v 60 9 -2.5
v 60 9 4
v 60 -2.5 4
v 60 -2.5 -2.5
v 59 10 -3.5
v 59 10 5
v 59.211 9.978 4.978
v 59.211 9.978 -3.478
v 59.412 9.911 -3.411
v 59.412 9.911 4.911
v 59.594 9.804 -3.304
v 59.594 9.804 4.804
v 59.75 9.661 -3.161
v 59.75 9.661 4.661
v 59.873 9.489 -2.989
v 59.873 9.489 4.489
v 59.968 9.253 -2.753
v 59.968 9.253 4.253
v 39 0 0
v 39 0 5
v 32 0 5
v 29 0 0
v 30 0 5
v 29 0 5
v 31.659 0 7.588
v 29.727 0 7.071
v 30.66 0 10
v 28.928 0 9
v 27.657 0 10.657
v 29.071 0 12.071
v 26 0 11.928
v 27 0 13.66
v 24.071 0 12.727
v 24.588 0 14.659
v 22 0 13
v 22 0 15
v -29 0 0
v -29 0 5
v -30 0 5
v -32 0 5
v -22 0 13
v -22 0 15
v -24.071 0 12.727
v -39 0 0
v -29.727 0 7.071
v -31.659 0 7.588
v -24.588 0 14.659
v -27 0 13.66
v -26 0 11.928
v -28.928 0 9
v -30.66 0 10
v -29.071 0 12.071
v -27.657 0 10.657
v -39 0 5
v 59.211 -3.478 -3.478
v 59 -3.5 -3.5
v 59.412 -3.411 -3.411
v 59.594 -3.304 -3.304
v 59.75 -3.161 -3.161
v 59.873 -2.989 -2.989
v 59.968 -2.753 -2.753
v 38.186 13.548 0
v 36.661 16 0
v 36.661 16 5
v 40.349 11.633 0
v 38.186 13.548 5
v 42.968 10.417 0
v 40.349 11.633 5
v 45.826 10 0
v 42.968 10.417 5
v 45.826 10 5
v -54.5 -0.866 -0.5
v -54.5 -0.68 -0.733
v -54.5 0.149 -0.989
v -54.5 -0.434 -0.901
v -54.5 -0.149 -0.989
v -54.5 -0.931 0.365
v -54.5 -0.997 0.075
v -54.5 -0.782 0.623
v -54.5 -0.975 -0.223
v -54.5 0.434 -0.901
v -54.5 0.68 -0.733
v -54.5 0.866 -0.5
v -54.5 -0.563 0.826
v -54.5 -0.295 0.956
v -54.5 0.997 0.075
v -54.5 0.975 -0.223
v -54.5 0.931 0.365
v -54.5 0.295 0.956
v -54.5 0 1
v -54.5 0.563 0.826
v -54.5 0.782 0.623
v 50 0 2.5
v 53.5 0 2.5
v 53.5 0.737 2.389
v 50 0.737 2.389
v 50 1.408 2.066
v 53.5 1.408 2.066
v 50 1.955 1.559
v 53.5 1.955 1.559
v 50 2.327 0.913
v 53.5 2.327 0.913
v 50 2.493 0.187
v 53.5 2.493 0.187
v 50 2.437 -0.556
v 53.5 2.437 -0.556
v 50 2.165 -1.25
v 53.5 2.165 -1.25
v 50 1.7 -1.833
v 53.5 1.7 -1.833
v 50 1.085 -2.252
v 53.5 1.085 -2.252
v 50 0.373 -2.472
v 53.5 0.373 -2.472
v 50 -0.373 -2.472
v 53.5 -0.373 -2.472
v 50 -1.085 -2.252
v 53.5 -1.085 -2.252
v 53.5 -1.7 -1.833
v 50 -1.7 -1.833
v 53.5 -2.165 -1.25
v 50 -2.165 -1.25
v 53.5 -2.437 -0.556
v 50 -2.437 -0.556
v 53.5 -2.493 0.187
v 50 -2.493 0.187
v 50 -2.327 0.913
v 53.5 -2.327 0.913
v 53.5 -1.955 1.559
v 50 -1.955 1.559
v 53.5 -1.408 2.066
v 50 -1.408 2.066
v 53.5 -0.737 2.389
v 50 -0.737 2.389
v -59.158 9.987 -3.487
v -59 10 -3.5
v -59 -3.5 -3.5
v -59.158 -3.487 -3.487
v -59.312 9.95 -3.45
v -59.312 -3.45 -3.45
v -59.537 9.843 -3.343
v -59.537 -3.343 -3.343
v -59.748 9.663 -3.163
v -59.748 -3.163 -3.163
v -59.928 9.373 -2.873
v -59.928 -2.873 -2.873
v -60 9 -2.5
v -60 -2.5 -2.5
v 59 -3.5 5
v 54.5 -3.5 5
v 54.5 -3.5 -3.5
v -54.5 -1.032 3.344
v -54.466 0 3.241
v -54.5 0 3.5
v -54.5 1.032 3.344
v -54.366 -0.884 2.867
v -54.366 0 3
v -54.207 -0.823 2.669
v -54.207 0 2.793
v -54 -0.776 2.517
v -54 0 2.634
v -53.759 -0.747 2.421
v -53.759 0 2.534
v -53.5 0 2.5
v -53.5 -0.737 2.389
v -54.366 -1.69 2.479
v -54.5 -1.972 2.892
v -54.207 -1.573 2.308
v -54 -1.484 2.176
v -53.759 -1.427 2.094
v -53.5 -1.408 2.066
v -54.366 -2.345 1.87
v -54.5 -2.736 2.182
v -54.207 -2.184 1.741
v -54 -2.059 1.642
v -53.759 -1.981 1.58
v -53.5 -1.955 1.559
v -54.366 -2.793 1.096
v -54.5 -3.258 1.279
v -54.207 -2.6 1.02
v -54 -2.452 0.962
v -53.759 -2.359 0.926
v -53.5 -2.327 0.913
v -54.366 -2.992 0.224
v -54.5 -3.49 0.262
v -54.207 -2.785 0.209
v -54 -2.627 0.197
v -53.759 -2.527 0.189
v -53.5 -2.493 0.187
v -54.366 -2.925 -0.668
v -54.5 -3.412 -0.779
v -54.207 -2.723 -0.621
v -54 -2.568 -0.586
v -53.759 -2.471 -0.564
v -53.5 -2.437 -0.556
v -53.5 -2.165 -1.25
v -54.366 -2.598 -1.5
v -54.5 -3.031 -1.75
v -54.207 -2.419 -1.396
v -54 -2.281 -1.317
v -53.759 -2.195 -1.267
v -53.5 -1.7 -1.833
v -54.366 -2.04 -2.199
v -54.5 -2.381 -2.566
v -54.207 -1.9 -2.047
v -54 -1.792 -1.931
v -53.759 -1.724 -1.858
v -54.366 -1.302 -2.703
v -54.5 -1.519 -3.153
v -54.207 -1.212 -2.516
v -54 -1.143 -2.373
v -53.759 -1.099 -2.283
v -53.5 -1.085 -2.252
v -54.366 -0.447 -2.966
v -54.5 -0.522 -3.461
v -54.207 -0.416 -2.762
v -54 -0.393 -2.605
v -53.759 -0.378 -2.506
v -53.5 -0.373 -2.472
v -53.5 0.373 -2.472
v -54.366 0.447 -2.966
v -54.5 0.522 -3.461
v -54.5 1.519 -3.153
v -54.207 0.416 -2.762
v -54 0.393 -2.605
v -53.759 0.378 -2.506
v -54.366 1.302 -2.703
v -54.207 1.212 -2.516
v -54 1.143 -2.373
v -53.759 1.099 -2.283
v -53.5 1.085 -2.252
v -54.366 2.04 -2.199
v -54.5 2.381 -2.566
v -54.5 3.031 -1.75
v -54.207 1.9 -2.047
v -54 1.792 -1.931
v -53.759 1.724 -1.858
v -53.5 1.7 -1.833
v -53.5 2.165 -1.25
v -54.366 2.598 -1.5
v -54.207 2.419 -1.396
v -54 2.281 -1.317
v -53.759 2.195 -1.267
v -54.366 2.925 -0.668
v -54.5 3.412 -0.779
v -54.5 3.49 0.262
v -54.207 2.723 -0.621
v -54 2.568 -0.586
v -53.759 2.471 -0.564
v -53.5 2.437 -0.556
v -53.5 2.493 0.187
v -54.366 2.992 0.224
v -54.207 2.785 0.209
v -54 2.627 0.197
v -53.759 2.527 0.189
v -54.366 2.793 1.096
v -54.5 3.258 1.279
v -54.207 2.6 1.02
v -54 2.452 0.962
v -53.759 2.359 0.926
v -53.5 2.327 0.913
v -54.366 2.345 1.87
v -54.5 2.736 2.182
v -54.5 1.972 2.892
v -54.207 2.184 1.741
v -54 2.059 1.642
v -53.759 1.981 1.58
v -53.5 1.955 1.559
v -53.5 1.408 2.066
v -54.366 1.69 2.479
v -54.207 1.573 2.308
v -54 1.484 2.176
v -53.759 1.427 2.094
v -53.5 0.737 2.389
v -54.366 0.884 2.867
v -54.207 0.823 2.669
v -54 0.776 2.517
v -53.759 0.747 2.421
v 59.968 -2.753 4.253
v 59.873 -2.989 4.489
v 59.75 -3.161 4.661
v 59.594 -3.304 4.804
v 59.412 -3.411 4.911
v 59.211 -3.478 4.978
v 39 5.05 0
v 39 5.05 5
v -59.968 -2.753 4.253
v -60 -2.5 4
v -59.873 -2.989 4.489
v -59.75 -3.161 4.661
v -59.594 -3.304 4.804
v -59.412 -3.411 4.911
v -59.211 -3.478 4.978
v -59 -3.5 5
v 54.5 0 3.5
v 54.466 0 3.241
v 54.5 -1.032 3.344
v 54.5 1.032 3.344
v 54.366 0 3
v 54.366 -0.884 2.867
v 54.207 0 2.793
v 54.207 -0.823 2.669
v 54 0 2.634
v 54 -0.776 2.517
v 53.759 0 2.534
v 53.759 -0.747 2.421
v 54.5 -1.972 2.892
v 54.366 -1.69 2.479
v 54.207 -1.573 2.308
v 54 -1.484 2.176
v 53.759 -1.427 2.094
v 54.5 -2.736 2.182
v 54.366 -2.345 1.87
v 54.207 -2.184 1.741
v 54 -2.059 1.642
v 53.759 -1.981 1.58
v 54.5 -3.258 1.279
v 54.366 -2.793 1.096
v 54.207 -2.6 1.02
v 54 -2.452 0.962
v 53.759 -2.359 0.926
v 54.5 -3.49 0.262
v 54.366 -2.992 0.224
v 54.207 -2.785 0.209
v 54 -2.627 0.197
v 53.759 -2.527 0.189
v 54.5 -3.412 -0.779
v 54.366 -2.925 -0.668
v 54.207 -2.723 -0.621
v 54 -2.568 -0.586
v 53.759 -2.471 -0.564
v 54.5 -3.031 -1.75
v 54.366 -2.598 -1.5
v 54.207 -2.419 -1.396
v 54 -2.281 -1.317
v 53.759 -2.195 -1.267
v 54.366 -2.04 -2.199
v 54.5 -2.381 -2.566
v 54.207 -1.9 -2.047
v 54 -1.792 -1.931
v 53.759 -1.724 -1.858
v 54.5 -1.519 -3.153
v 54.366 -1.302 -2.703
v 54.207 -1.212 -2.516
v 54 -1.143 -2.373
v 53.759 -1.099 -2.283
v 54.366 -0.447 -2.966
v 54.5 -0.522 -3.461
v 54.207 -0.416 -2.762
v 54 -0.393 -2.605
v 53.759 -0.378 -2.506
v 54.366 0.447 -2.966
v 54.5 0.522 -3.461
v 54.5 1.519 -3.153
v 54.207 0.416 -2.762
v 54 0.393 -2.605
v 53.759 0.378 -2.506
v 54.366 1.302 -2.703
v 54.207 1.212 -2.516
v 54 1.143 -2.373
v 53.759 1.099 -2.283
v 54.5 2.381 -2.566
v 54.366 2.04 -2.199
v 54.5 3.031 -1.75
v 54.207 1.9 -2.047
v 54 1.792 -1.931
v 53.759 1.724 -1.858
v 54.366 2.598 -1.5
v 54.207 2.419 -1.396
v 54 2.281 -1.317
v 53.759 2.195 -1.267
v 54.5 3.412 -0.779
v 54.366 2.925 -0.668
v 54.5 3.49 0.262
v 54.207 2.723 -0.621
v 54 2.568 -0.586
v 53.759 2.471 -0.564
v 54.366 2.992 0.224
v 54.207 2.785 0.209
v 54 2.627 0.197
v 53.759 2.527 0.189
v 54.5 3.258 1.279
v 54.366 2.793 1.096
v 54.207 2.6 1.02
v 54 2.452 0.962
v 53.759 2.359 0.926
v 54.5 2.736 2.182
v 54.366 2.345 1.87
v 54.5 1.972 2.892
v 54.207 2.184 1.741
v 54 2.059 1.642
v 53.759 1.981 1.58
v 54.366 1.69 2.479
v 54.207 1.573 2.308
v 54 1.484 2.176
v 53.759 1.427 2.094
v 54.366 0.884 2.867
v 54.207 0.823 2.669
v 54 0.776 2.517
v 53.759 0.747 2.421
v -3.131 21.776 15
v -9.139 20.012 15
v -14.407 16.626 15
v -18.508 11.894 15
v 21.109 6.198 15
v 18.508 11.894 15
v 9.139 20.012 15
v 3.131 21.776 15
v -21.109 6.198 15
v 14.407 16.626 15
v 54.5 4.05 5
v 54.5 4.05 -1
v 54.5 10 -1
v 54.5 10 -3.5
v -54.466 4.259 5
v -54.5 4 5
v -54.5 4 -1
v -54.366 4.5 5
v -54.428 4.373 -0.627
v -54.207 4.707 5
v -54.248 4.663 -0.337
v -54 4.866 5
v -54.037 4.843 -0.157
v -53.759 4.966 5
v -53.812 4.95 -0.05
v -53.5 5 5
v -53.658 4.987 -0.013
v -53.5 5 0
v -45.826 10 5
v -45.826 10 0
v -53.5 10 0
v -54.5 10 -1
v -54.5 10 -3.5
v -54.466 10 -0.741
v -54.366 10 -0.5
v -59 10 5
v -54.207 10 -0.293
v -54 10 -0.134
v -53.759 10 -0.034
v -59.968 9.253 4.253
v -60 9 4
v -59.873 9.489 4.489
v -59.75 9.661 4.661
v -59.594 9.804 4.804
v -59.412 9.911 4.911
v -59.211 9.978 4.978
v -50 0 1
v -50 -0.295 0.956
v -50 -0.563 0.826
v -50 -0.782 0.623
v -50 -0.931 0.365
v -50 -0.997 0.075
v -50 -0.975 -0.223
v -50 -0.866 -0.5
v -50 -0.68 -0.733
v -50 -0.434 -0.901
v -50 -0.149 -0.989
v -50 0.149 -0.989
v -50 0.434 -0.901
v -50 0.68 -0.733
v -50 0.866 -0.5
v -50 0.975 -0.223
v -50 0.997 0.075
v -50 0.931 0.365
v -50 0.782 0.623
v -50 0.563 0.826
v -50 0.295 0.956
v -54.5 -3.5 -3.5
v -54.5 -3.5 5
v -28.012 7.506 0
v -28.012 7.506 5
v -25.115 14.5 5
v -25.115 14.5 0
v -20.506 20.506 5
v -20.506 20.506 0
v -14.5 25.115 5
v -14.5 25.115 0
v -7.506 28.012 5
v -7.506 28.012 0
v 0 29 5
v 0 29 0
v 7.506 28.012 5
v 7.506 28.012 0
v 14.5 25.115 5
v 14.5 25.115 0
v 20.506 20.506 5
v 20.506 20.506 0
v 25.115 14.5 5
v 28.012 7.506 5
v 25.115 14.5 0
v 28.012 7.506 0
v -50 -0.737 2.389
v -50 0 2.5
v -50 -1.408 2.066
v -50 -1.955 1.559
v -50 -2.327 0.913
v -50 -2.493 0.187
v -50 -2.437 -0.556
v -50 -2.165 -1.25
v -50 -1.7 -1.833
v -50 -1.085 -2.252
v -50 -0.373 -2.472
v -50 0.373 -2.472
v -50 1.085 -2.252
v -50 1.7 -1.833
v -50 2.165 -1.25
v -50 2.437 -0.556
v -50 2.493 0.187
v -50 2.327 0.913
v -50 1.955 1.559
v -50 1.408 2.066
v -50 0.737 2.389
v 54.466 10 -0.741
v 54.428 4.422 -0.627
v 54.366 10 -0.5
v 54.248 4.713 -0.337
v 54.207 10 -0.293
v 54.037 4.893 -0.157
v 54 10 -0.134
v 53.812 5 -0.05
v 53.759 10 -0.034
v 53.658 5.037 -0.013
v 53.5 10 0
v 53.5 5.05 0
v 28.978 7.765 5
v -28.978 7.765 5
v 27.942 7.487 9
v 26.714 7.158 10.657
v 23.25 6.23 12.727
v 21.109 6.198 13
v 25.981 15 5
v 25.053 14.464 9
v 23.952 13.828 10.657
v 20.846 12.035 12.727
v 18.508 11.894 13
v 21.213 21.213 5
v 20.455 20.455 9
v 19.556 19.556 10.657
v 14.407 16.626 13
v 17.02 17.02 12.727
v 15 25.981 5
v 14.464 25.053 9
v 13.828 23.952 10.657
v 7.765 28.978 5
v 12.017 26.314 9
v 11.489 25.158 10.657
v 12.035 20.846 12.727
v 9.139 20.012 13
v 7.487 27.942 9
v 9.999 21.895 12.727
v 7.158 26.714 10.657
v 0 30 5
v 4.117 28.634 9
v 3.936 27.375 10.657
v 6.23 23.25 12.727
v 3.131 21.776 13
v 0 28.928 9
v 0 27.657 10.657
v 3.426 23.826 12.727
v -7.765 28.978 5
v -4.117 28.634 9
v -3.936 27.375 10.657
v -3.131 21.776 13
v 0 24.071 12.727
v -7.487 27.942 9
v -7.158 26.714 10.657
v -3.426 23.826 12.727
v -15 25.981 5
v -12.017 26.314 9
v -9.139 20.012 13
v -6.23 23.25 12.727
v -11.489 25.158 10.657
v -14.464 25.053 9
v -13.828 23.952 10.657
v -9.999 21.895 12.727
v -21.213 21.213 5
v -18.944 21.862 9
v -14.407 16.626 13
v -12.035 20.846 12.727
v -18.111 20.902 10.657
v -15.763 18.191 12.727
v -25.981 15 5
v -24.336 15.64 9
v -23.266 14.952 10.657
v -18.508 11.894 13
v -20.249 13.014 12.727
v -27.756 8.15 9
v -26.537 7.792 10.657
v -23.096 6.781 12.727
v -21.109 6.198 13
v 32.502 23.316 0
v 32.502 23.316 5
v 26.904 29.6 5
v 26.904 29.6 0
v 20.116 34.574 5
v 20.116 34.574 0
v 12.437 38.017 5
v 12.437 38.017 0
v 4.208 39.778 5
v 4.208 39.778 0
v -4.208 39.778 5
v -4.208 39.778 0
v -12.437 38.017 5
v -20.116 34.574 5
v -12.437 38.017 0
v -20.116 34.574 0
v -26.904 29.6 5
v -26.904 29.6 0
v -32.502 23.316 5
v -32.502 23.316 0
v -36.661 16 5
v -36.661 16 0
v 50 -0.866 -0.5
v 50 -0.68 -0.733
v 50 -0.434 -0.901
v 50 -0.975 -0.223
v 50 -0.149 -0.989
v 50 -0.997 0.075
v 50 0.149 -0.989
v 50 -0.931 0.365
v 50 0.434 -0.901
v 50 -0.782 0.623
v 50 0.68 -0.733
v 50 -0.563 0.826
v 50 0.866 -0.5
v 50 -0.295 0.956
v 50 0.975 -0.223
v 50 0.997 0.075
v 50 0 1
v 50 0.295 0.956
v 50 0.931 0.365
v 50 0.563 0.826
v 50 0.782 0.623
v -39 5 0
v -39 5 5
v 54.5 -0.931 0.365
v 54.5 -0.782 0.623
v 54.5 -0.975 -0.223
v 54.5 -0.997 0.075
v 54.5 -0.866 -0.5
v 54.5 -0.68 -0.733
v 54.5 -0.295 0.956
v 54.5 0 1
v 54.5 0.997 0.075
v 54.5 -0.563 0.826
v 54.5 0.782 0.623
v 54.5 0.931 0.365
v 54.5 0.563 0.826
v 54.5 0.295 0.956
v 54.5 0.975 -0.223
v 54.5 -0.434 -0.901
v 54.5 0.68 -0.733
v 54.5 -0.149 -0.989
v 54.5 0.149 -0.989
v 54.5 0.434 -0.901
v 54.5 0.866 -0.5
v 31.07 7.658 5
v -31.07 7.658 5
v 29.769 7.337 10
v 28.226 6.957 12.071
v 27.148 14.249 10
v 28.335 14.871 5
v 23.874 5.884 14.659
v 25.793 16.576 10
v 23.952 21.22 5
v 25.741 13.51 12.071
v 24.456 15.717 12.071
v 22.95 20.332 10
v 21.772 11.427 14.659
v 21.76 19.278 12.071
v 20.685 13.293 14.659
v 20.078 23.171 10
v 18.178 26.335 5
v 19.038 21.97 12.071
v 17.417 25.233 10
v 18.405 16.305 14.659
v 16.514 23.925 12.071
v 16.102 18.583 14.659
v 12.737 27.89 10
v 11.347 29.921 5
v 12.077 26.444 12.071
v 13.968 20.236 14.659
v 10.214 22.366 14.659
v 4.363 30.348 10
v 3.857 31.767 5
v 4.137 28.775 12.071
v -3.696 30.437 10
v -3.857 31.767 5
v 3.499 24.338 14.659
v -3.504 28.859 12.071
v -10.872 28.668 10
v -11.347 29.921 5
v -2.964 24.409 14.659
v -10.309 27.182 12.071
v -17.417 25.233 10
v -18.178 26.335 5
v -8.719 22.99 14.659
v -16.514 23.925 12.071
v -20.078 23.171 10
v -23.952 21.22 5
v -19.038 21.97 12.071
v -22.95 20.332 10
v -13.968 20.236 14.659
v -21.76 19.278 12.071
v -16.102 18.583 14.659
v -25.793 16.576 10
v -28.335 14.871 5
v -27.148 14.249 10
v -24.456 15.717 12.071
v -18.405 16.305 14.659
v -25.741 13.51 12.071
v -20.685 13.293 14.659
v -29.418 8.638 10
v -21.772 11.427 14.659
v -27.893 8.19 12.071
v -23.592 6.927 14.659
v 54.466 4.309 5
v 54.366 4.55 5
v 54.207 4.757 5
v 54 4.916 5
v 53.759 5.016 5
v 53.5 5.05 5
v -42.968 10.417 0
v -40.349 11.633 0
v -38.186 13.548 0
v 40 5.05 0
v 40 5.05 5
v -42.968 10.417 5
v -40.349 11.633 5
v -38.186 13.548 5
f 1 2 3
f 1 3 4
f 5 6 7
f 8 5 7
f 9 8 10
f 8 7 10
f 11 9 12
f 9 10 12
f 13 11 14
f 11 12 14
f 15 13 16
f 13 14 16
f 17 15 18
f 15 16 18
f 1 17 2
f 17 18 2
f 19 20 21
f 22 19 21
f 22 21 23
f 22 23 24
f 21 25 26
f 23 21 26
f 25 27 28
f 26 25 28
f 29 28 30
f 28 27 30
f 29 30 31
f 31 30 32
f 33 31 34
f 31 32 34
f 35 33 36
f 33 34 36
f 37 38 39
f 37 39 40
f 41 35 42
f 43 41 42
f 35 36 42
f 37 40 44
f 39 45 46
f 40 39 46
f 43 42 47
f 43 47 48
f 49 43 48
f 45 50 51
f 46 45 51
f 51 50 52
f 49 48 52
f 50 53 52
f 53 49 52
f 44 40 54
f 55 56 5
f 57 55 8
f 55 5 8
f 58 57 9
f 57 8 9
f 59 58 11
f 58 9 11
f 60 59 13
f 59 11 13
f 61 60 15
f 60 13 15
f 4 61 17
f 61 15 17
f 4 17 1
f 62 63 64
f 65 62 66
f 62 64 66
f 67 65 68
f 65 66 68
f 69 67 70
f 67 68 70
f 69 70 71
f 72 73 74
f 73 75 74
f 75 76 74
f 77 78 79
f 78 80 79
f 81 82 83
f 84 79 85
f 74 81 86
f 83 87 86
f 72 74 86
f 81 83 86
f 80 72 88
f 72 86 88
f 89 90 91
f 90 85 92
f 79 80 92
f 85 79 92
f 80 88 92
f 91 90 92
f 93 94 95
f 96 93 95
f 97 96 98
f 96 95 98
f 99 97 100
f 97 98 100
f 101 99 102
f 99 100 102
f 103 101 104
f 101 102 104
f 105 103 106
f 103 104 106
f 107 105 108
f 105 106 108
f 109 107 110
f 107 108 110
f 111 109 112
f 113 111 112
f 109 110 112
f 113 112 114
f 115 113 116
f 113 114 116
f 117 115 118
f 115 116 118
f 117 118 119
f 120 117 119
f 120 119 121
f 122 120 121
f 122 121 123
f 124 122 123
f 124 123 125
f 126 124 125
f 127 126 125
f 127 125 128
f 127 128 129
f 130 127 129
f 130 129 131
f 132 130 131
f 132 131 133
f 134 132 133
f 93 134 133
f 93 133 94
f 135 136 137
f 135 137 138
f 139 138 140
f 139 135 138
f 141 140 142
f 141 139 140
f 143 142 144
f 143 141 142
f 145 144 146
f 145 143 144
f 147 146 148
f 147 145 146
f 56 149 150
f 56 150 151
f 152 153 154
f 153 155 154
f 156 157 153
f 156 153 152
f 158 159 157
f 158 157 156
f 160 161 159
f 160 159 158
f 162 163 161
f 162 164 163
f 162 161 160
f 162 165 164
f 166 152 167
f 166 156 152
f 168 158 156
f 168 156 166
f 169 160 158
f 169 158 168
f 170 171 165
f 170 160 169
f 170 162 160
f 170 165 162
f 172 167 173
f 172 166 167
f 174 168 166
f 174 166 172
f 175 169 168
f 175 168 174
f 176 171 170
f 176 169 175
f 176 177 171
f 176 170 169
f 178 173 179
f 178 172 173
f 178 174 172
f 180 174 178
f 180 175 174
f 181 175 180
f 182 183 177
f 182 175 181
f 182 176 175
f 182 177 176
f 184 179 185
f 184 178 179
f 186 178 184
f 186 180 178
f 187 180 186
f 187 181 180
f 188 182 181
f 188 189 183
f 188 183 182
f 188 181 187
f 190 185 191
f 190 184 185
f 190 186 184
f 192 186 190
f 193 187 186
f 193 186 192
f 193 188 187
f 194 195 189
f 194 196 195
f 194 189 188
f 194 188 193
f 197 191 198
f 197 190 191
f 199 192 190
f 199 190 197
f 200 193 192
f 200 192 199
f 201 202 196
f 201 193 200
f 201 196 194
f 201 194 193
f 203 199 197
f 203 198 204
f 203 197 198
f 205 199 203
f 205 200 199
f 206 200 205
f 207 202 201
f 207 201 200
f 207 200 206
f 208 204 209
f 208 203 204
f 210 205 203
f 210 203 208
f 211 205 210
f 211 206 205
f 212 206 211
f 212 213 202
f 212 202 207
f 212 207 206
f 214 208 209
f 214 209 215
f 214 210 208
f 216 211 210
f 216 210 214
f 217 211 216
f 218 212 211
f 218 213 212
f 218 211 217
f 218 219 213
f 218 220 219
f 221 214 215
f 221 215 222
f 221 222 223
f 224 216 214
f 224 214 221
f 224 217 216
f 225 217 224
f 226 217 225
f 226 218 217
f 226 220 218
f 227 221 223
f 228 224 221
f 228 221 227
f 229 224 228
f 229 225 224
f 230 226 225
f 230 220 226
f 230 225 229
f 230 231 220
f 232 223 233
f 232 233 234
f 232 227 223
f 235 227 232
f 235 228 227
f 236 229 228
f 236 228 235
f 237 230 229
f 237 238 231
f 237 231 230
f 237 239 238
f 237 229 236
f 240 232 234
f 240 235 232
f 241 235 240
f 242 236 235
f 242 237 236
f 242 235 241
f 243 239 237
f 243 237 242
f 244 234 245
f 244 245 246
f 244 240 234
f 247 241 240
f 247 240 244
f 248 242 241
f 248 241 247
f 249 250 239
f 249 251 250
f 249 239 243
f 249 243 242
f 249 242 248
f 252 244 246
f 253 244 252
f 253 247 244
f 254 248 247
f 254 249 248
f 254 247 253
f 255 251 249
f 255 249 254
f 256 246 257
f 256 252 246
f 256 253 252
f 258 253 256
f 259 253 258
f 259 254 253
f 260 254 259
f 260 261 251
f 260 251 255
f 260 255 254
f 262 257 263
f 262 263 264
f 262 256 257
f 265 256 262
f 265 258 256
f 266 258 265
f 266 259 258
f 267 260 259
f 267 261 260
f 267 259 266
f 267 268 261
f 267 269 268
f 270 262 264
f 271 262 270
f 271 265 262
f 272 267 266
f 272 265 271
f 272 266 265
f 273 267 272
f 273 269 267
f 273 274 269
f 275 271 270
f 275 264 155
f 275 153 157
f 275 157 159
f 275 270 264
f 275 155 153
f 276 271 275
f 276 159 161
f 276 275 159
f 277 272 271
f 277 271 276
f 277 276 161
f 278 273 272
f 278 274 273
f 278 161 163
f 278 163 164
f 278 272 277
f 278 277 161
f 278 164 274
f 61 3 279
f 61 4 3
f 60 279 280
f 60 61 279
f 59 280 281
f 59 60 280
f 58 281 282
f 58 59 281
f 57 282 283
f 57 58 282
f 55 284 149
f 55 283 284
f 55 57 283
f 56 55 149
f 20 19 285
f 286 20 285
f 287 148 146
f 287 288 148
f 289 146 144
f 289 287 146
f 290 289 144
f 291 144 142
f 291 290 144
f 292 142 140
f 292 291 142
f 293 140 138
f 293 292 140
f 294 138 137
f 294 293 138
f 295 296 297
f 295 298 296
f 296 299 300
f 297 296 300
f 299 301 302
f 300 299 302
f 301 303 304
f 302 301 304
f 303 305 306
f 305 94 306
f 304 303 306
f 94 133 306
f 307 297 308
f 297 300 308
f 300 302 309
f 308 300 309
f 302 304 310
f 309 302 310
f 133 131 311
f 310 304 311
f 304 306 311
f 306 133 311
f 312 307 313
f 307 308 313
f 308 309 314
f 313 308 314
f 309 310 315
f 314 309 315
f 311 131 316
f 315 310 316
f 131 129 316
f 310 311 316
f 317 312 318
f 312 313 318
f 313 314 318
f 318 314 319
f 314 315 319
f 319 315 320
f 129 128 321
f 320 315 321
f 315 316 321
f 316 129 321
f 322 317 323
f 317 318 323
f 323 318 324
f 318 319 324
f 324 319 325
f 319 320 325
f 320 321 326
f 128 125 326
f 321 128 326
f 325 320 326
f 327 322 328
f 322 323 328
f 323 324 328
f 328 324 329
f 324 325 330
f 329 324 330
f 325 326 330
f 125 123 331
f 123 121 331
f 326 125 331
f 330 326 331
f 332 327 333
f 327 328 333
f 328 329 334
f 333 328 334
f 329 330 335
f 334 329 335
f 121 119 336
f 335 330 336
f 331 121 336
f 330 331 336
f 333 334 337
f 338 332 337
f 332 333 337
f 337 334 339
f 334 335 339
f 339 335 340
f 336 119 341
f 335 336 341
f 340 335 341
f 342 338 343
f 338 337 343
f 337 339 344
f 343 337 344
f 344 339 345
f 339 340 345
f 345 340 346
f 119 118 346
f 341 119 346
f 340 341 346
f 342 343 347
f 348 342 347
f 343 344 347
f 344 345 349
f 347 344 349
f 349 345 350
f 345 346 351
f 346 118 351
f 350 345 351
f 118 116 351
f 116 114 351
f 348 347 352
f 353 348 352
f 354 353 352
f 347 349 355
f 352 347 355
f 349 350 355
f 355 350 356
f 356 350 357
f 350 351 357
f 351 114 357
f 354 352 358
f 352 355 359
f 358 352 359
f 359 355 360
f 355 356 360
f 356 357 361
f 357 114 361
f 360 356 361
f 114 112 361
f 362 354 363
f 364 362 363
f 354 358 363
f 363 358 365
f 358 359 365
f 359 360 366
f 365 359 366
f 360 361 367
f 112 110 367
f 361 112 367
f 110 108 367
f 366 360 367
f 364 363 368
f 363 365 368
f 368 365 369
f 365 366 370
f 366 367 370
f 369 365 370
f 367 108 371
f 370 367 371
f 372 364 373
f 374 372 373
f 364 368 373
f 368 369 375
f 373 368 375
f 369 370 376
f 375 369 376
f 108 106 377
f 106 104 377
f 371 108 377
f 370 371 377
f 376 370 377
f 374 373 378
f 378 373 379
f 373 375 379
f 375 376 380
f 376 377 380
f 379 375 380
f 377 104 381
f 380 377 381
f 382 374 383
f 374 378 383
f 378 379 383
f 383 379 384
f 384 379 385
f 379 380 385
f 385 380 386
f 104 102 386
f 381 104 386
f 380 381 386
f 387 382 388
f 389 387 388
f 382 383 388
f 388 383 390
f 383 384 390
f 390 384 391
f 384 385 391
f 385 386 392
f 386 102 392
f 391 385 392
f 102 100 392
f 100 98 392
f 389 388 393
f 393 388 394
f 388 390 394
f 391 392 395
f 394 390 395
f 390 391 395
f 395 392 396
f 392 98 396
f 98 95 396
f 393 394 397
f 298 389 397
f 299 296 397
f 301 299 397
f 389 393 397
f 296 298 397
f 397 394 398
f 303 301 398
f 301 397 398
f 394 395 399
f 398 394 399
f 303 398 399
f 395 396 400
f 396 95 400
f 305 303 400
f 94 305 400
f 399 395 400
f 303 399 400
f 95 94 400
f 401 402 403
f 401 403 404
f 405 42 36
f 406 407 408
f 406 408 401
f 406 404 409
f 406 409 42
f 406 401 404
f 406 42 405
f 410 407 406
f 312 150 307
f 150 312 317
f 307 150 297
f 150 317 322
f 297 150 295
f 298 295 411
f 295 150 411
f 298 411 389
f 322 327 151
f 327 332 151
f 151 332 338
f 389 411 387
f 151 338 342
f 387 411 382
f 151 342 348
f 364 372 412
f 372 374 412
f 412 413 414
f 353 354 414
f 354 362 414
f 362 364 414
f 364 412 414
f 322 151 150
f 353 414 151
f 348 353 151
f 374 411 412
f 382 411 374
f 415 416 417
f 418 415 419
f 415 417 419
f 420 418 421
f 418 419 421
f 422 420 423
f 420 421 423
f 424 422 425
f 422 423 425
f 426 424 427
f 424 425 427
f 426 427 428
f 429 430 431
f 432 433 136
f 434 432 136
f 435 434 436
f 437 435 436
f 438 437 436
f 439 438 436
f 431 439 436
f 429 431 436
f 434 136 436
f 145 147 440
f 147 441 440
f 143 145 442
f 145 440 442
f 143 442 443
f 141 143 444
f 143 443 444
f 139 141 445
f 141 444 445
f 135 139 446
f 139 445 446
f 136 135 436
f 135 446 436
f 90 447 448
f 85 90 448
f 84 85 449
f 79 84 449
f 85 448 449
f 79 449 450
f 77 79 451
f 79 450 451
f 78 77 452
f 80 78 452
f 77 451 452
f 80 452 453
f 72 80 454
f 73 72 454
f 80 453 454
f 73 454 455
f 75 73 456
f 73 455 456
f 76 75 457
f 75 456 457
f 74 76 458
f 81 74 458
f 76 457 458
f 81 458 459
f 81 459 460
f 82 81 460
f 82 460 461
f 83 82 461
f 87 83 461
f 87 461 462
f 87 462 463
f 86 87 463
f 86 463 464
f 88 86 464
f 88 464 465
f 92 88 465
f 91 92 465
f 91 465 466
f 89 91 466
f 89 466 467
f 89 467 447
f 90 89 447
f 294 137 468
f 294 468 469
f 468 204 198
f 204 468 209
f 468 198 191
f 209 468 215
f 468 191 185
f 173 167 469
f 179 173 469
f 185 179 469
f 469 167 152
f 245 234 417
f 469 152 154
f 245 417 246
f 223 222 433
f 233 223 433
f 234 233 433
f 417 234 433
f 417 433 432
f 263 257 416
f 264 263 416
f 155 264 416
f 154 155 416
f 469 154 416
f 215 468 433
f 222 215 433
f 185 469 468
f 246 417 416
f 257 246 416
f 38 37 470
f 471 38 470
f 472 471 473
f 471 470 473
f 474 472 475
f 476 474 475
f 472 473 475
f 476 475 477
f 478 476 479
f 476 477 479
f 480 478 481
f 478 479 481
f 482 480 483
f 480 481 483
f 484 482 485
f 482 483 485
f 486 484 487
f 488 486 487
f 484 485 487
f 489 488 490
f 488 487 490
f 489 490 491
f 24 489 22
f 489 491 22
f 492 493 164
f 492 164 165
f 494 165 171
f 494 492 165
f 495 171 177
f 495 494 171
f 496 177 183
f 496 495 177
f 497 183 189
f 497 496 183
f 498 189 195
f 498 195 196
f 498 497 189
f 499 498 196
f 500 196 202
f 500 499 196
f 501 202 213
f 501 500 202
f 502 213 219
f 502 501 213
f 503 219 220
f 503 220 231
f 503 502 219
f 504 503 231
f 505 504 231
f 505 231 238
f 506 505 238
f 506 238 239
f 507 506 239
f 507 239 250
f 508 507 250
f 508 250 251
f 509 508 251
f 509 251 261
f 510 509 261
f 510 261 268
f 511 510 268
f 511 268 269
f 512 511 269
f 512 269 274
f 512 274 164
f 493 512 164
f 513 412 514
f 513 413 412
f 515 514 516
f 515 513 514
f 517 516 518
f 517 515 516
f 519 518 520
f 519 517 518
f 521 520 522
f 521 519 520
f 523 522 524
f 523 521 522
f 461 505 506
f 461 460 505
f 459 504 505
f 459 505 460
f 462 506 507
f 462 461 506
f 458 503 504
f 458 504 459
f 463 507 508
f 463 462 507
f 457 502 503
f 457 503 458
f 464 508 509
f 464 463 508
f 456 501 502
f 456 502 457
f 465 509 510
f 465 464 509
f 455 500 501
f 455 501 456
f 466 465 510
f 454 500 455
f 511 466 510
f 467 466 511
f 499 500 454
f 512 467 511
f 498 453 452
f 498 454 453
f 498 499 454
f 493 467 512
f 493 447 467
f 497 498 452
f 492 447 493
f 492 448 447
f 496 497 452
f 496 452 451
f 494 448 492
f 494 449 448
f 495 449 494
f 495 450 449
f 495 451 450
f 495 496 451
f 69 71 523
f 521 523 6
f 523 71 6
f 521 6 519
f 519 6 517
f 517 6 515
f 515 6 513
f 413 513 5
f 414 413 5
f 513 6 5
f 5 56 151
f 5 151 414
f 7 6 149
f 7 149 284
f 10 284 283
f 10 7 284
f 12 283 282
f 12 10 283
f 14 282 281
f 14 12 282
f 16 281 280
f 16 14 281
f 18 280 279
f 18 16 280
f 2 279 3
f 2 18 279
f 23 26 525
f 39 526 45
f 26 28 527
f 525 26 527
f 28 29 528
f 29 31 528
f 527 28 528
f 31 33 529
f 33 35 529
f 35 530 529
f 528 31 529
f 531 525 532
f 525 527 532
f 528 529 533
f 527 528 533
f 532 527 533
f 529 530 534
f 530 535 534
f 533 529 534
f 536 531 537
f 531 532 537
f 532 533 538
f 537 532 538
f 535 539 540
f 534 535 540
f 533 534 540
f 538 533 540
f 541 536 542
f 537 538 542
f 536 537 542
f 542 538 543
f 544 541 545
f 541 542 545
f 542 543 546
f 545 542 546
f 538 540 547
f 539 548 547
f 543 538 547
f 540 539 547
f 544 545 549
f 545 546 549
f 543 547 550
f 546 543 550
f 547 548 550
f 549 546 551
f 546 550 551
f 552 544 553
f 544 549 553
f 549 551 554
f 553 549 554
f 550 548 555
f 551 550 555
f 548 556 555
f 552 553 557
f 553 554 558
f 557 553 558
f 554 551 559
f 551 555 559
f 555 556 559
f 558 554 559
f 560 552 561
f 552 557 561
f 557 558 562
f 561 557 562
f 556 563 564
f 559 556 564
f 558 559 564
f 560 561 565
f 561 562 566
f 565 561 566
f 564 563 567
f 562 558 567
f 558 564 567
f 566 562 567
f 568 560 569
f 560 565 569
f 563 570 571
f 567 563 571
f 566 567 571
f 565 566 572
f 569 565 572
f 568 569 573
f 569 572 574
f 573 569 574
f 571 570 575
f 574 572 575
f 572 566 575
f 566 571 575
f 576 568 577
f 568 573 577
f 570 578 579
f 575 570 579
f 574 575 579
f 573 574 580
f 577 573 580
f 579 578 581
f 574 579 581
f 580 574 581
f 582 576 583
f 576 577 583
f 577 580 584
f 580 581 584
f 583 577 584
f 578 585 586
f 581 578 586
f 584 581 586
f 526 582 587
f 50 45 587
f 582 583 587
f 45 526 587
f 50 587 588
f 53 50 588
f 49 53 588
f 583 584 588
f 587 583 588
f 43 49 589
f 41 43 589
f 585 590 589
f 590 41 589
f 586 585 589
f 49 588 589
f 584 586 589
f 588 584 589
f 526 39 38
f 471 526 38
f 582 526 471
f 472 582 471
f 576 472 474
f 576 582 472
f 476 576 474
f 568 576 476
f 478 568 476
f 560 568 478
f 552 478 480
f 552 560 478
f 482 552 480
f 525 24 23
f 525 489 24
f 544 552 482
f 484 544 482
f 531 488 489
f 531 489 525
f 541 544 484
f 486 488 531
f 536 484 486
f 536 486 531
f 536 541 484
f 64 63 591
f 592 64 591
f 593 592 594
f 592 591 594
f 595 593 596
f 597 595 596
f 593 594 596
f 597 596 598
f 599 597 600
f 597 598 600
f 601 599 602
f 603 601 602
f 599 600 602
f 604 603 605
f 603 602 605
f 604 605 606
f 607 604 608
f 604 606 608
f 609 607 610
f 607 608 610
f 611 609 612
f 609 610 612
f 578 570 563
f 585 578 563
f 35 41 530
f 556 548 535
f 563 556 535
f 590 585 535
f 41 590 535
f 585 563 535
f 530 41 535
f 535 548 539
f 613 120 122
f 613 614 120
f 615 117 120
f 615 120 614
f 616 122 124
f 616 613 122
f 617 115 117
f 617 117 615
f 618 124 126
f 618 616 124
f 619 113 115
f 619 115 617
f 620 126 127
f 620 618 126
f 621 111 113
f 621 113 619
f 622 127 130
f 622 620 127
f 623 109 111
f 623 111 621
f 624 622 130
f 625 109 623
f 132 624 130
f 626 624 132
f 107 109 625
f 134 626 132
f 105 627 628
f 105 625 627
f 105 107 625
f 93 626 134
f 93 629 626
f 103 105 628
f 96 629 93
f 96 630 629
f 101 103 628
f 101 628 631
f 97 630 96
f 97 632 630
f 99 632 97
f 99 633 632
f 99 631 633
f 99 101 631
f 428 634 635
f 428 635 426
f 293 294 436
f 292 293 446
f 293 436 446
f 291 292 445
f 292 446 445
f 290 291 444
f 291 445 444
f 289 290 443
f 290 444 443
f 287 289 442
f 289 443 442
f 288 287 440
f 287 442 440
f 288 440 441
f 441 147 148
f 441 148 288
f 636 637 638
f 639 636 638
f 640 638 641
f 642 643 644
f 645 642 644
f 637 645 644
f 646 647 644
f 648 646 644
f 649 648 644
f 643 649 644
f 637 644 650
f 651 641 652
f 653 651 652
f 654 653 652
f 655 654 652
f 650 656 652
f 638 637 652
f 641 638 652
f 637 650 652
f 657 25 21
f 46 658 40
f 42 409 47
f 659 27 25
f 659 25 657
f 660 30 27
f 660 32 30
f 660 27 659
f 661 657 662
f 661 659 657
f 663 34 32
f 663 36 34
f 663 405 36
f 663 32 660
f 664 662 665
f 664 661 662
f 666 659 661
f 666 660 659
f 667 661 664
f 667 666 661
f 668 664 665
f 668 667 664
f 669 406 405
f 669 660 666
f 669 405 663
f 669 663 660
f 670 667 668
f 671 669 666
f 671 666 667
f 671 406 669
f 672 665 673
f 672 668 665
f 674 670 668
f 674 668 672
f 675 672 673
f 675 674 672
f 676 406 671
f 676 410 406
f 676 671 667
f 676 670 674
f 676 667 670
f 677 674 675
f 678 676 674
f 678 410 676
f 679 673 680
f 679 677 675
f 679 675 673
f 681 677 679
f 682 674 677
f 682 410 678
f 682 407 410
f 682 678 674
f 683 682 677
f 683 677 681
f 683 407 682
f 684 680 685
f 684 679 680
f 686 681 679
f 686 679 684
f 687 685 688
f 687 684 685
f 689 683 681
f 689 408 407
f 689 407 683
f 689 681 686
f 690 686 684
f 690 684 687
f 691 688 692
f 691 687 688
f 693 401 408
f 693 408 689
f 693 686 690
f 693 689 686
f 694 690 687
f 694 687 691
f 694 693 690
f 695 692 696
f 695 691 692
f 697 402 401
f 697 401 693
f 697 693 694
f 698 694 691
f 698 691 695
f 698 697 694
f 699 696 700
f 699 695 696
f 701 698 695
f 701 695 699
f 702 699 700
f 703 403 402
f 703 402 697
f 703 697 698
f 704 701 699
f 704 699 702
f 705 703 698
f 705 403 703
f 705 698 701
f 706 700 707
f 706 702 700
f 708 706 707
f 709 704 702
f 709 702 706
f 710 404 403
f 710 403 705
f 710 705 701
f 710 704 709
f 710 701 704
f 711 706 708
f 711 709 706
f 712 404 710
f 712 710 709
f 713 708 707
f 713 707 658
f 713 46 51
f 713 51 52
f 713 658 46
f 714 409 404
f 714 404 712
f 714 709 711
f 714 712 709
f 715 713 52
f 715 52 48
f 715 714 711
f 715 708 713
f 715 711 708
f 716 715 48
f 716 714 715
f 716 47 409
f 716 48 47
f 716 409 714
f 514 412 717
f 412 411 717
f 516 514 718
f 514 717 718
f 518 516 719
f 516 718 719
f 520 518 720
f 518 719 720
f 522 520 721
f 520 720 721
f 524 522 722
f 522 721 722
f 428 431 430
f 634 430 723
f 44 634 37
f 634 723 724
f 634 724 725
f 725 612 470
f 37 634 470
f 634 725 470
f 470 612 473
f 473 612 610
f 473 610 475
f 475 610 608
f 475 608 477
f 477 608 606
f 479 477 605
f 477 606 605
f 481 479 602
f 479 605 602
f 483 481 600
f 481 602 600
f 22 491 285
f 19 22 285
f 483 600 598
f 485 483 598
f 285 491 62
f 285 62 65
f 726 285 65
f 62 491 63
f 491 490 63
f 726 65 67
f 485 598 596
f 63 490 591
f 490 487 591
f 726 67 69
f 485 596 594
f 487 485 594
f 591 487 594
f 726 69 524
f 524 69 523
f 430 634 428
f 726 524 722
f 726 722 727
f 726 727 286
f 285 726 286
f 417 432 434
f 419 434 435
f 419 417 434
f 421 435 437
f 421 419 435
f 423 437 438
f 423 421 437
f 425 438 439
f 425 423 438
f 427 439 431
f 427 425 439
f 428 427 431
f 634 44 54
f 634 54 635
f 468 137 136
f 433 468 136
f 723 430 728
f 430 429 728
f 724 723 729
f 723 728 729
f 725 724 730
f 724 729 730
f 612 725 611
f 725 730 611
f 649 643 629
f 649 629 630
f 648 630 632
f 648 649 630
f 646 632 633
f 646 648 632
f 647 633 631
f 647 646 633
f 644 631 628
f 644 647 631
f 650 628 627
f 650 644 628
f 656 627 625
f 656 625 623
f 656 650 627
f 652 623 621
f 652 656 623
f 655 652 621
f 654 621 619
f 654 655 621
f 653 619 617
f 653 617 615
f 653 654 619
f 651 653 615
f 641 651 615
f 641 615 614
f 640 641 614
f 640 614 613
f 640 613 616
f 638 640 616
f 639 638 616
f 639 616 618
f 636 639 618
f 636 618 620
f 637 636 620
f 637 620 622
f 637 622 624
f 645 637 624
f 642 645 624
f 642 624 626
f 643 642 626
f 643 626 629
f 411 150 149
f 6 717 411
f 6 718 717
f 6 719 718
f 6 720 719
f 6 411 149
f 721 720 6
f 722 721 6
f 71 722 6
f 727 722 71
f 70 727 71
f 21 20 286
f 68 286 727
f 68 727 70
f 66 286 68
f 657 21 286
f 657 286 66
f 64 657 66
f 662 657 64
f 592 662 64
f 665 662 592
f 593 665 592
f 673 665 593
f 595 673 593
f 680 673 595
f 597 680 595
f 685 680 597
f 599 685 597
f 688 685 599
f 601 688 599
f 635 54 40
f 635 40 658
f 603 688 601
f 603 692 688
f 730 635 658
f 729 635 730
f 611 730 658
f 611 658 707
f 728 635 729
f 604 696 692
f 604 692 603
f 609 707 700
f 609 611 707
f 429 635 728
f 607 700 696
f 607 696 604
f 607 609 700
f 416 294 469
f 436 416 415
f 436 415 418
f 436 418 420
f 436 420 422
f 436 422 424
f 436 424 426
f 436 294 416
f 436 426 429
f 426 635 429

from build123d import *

# Parameters (mm, degrees)
SKETCH1_R              = 32
BOSS_EXTRUDE1_DEPTH    = 15
FILLET1_R              = 10
SHELL1_T               = -2
SKETCH2_W              = 15
SKETCH2_H              = 10
BOSS_EXTRUDE2_DEPTH    = 5
SKETCH3_R              = 29
CUT_EXTRUDE1_DEPTH     = 5
SPLIT1_SURFACE_1_BACK  = 146
SPLIT1_SURFACE_1_DEPTH = 292
SPLIT1_SURFACE_2_BACK  = 146
SPLIT1_SURFACE_2_DEPTH = 292
SKETCH6_R              = 2.5
SKETCH6_R_2            = 1
BOSS_EXTRUDE3_DEPTH    = 5
BOSS_EXTRUDE4_START    = 5
SKETCH5_R              = 2.5
SKETCH5_R_2            = 1
BOSS_EXTRUDE4_DEPTH    = 5
SKETCH7_W              = 8.5
SKETCH7_H              = 13.5
BOSS_EXTRUDE5_DEPTH    = 5.5
SKETCH8_W              = 8.5
SKETCH8_H              = 13.5
BOSS_EXTRUDE6_DEPTH    = 5.5
FILLET3_R              = 1
FILLET4_R              = 10
SKETCH9_W              = 1
SKETCH9_H              = 5.049910015
SKETCH9_H_2            = 5
CUT_EXTRUDE2_DEPTH     = 10


with BuildPart() as part:
    # Sketch1 → Boss-Extrude1 (new body)
    with BuildSketch(Plane.XY):
        Circle(SKETCH1_R)
    extrude(amount=BOSS_EXTRUDE1_DEPTH)

    # Fillet1
    fillet1_edges = [part.edges().sort_by_distance(p)[0] for p in [
        (-32, 0, 15),
    ]]
    fillet(fillet1_edges, radius=FILLET1_R)

    # Shell1
    shell1_openings = [part.faces().sort_by_distance(p)[0] for p in [
        (0, 0, 0),
    ]]
    offset(amount=SHELL1_T, openings=shell1_openings, kind=Kind.INTERSECTION)

    # Sketch2 → Boss-Extrude2 (add)
    with BuildSketch(Plane(origin=(0, 0, 0), x_dir=(-1, 0, 0), z_dir=(0, 0, -1))):
        with BuildLine():
            Line((-60, 10), (-38.729833462, 10))
            ThreePointArc((-38.729833462, 10), (0, 40), (38.729833462, 10))
            Line((38.729833462, 10), (60, 10))
            Line((60, 10), (60, -10))
            Line((60, -10), (38.729833462, -10))
            ThreePointArc((38.729833462, -10), (0, -40), (-38.729833462, -10))
            Line((-38.729833462, -10), (-60, -10))
            Line((-60, -10), (-60, 10))
        make_face()
        with Locations((-47.5, 0.049910015)):
            Rectangle(SKETCH2_W, SKETCH2_H, mode=Mode.SUBTRACT)
        with Locations((47.5, 0)):
            Rectangle(SKETCH2_W, SKETCH2_H, mode=Mode.SUBTRACT)
    extrude(amount=-BOSS_EXTRUDE2_DEPTH)

    # Sketch3 → Cut-Extrude1 (cut)
    with BuildSketch(Plane(origin=(0, 0, 0), x_dir=(-1, 0, 0), z_dir=(0, 0, -1))):
        Circle(SKETCH3_R)
    extrude(amount=-CUT_EXTRUDE1_DEPTH, mode=Mode.SUBTRACT)


with BuildPart() as body_2:
    # Split1: the piece behind the surface
    add(part.part)
    # Split1 surface: a surface, the sketch's curves swept straight by 292 mm
    with BuildLine(Plane(origin=(0, 0, 0), x_dir=(-1, 0, 0), z_dir=(0, 0, -1)).offset(-SPLIT1_SURFACE_1_BACK), mode=Mode.PRIVATE) as split1_surface_1_path:
        Line((-60, 0), (60, 0))
    split1_surface_1 = Shell.extrude(split1_surface_1_path.wire(), (0 * SPLIT1_SURFACE_1_DEPTH, 0 * SPLIT1_SURFACE_1_DEPTH, -1 * SPLIT1_SURFACE_1_DEPTH))
    split(bisect_by=split1_surface_1, keep=Keep.BOTTOM)


with BuildPart() as part_1:
    add(part.part)

    # Split1: split by a surface, the side it looks to stays
    # Split1 surface: a surface, the sketch's curves swept straight by 292 mm
    with BuildLine(Plane(origin=(0, 0, 0), x_dir=(-1, 0, 0), z_dir=(0, 0, -1)).offset(-SPLIT1_SURFACE_2_BACK), mode=Mode.PRIVATE) as split1_surface_2_path:
        Line((-60, 0), (60, 0))
    split1_surface_2 = Shell.extrude(split1_surface_2_path.wire(), (0 * SPLIT1_SURFACE_2_DEPTH, 0 * SPLIT1_SURFACE_2_DEPTH, -1 * SPLIT1_SURFACE_2_DEPTH))
    split(bisect_by=split1_surface_2, keep=Keep.TOP)

    # Sketch6 → Boss-Extrude3 (add)
    with BuildSketch(Plane.ZY.offset(-55)):
        Circle(SKETCH6_R)
        Circle(SKETCH6_R_2, mode=Mode.SUBTRACT)
    extrude(amount=BOSS_EXTRUDE3_DEPTH)

    # Sketch5 → Boss-Extrude4 (add)
    with BuildSketch(Plane(origin=(-55, 0, 0), x_dir=(0, 0, -1), z_dir=(1, 0, 0)).offset(BOSS_EXTRUDE4_START)):
        with Locations(Location((0, 0, 0), (0, 0, 180))):
            Circle(SKETCH5_R)
        with Locations(Location((0, 0, 0), (0, 0, 180))):
            Circle(SKETCH5_R_2, mode=Mode.SUBTRACT)
    extrude(amount=-BOSS_EXTRUDE4_DEPTH)

    # Sketch7 → Boss-Extrude5 (add)
    with BuildSketch(Plane(origin=(60, 0, 0), x_dir=(0, 0, -1), z_dir=(1, 0, 0))):
        with Locations((-0.75, 3.25)):
            Rectangle(SKETCH7_W, SKETCH7_H)
    extrude(amount=-BOSS_EXTRUDE5_DEPTH)

    # Sketch8 → Boss-Extrude6 (add)
    with BuildSketch(Plane.ZY.offset(60)):
        with Locations((0.75, 3.25)):
            Rectangle(SKETCH8_W, SKETCH8_H)
    extrude(amount=-BOSS_EXTRUDE6_DEPTH)

    # Fillet3
    fillet3_edges = [part_1.edges().sort_by_distance(p)[0] for p in [
        (60, 3.25, 5),
        (-60, 3.25, 5),
        (-60, 10, 0.75),
        (60, 10, 0.75),
        (54.5, 5.049910015, 2.5),
        (54.5, 7.524955008, 0),
        (54.5, 0, -2.5),
        (60, 3.25, -3.5),
        (60, -3.5, 0.75),
        (-54.5, 0, -2.5),
        (-54.5, 7.5, 0),
        (-54.5, 5, 2.5),
        (-60, -3.5, 0.75),
        (-60, 3.25, -3.5),
    ]]
    fillet(fillet3_edges, radius=FILLET3_R - 0.0001)  # a hair under: the kernel refuses the full size

    # Fillet4
    fillet4_edges = [part_1.edges().sort_by_distance(p)[0] for p in [
        (-38.729833462, 10, 2.5),
        (38.729833462, 10, 2.5),
    ]]
    fillet(fillet4_edges, radius=FILLET4_R)

    # Sketch9 → Cut-Extrude2 (cut)
    with BuildSketch(Plane(origin=(0, 0, 0), x_dir=(-1, 0, 0), z_dir=(0, 0, -1))):
        with Locations((-39.5, 2.524955008)):
            Rectangle(SKETCH9_W, SKETCH9_H)
        with Locations((39.5, 2.5)):
            Rectangle(SKETCH9_W, SKETCH9_H_2)
    extrude(amount=-CUT_EXTRUDE2_DEPTH, mode=Mode.SUBTRACT)


solid = part_1.part
